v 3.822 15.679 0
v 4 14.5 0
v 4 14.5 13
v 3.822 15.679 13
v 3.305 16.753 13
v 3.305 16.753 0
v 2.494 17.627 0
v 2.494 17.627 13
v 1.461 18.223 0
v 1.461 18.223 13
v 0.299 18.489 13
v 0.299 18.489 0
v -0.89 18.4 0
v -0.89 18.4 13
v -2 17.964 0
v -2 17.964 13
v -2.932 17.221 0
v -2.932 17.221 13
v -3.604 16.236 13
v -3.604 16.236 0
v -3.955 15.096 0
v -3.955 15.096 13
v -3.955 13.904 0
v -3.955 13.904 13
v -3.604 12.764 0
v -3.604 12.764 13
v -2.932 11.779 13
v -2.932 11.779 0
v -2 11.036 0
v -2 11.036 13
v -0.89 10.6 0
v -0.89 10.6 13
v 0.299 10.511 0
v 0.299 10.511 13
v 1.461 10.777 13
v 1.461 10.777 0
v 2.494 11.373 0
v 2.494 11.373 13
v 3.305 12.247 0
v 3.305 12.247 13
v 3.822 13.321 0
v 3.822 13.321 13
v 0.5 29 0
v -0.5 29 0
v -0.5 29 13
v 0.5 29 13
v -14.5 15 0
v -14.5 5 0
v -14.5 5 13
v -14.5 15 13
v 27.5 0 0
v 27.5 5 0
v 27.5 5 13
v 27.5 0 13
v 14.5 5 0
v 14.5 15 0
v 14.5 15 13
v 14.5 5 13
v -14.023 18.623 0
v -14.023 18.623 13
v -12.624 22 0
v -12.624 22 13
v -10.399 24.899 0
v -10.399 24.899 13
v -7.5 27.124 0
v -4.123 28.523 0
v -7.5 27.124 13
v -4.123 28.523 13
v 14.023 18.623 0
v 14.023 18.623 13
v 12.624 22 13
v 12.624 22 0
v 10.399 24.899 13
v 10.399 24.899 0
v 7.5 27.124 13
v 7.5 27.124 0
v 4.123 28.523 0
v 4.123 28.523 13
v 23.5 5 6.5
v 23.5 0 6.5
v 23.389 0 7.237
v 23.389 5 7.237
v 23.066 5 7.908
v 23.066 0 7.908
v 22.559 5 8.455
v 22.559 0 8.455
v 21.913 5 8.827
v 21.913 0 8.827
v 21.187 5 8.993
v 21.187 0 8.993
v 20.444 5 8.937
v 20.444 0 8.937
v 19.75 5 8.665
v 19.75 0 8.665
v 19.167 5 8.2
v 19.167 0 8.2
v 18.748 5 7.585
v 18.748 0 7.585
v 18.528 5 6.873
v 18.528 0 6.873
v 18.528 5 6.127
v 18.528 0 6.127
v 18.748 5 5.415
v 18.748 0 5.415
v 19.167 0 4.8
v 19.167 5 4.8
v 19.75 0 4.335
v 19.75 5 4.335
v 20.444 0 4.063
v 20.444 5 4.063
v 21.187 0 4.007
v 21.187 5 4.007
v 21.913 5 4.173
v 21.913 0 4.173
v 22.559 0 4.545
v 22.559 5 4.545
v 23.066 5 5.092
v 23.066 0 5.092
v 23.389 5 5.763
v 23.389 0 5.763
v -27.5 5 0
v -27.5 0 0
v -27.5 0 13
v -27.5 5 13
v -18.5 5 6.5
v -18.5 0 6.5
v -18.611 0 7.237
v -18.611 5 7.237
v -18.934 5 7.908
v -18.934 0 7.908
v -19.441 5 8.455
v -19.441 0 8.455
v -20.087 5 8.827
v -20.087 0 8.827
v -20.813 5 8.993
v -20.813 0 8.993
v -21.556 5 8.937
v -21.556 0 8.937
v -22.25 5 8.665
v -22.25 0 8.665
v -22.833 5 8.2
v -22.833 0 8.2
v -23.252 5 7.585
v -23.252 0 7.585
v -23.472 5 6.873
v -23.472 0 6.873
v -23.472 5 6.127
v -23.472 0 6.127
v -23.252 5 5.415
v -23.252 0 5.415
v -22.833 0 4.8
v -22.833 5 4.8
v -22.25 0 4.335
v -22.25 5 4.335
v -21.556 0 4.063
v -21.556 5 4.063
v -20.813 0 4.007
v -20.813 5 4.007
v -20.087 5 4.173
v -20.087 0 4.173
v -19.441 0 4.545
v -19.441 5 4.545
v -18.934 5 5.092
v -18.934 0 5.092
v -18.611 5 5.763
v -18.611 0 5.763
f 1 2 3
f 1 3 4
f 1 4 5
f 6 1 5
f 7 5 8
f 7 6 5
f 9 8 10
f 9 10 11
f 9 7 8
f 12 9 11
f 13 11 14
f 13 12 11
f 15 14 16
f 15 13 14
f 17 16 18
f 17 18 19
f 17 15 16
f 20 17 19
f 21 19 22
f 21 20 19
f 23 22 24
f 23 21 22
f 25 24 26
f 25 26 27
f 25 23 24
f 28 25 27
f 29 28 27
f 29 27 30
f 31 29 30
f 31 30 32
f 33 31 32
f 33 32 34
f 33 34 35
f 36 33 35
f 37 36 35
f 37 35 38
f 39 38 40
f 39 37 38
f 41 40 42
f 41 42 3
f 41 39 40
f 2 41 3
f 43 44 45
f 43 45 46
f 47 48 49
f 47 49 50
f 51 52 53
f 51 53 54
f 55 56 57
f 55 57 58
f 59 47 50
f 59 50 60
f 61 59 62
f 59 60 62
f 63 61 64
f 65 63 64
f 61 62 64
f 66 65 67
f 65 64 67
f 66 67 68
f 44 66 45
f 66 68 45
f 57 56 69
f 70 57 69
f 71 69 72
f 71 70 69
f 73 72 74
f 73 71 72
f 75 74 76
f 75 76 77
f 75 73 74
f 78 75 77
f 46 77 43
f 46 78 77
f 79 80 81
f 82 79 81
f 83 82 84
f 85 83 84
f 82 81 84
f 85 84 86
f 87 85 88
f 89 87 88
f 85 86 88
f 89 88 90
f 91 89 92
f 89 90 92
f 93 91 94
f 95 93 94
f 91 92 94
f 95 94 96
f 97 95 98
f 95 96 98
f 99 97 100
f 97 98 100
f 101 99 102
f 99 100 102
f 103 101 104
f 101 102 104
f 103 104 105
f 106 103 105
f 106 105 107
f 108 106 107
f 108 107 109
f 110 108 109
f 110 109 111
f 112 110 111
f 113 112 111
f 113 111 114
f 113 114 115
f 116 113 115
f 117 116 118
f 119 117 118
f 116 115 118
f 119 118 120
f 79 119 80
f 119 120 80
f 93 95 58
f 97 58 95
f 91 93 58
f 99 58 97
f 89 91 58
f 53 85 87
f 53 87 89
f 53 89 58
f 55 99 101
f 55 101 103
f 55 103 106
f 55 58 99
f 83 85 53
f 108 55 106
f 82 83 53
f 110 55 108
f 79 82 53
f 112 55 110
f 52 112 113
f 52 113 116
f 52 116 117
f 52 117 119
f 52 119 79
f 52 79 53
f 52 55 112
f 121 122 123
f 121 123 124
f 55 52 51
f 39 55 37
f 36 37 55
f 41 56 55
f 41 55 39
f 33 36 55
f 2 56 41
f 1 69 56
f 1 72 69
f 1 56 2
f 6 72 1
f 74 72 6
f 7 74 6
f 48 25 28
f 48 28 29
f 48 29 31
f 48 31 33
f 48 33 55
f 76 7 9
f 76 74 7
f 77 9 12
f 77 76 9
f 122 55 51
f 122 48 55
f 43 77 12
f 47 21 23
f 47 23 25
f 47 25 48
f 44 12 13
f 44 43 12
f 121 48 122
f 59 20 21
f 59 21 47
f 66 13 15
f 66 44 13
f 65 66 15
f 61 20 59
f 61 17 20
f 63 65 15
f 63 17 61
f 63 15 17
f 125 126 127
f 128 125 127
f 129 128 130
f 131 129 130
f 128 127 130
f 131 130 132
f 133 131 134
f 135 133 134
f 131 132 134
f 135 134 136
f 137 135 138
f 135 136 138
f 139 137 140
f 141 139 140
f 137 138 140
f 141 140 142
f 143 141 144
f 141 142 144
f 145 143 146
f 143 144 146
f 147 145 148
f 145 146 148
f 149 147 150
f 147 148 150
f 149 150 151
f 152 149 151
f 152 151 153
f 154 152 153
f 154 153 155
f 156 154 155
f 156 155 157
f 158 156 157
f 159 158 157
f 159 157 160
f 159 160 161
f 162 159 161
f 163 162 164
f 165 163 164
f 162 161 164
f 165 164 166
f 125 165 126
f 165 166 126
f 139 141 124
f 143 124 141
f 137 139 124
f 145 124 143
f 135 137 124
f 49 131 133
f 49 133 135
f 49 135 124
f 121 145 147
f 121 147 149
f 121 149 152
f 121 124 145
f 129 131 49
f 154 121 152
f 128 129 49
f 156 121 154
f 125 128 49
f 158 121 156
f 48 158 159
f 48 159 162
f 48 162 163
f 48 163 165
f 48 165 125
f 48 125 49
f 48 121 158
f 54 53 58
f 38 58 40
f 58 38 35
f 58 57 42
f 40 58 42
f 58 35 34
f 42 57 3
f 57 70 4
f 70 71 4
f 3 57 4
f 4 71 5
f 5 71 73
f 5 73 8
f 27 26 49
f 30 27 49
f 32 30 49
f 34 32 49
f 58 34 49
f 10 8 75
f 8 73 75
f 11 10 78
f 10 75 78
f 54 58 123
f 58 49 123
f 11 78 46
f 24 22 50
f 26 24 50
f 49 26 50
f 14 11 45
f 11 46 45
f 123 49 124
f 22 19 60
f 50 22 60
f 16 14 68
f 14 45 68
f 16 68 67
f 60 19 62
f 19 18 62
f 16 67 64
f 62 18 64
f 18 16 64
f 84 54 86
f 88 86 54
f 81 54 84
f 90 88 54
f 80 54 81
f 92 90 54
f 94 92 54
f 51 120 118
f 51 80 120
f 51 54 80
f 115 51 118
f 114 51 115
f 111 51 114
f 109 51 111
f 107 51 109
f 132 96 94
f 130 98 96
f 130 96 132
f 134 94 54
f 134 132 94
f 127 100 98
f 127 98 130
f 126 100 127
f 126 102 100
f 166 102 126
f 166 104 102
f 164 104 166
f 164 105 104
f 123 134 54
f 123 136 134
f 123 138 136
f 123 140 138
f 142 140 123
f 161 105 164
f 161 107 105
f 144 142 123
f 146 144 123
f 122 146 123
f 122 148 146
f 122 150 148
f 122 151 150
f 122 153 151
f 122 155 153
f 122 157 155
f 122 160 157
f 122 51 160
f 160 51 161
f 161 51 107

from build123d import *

# Parameters (mm, degrees)
SKETCH_R     = 4
PAD_DEPTH    = 13
SKETCH001_R  = 2.5
POCKET_DEPTH = 5
FILLET_R     = 14


with BuildPart() as part:
    # Sketch → Pad (new body)
    with BuildSketch(Plane.XY):
        Polygon((27.5, 0), (-27.5, 0), (-27.5, 5), (-14.5, 5), (-14.5, 29), (14.5, 29), (14.5, 5), (27.5, 5), align=None)
        with Locations((0, 14.5)):
            Circle(SKETCH_R, mode=Mode.SUBTRACT)
    extrude(amount=PAD_DEPTH)

    # Sketch001 → Pocket (cut)
    with BuildSketch(Plane.XZ):
        with Locations((-21, 6.5)):
            Circle(SKETCH001_R)
        with Locations((21, 6.5)):
            Circle(SKETCH001_R)
    extrude(amount=-POCKET_DEPTH, mode=Mode.SUBTRACT)

    # Fillet
    fillet_edges = [part.edges().sort_by_distance(p)[0] for p in [
        (-14.5, 29, 6.5),
        (14.5, 29, 6.5),
    ]]
    fillet(fillet_edges, radius=FILLET_R)


solid = part.part
